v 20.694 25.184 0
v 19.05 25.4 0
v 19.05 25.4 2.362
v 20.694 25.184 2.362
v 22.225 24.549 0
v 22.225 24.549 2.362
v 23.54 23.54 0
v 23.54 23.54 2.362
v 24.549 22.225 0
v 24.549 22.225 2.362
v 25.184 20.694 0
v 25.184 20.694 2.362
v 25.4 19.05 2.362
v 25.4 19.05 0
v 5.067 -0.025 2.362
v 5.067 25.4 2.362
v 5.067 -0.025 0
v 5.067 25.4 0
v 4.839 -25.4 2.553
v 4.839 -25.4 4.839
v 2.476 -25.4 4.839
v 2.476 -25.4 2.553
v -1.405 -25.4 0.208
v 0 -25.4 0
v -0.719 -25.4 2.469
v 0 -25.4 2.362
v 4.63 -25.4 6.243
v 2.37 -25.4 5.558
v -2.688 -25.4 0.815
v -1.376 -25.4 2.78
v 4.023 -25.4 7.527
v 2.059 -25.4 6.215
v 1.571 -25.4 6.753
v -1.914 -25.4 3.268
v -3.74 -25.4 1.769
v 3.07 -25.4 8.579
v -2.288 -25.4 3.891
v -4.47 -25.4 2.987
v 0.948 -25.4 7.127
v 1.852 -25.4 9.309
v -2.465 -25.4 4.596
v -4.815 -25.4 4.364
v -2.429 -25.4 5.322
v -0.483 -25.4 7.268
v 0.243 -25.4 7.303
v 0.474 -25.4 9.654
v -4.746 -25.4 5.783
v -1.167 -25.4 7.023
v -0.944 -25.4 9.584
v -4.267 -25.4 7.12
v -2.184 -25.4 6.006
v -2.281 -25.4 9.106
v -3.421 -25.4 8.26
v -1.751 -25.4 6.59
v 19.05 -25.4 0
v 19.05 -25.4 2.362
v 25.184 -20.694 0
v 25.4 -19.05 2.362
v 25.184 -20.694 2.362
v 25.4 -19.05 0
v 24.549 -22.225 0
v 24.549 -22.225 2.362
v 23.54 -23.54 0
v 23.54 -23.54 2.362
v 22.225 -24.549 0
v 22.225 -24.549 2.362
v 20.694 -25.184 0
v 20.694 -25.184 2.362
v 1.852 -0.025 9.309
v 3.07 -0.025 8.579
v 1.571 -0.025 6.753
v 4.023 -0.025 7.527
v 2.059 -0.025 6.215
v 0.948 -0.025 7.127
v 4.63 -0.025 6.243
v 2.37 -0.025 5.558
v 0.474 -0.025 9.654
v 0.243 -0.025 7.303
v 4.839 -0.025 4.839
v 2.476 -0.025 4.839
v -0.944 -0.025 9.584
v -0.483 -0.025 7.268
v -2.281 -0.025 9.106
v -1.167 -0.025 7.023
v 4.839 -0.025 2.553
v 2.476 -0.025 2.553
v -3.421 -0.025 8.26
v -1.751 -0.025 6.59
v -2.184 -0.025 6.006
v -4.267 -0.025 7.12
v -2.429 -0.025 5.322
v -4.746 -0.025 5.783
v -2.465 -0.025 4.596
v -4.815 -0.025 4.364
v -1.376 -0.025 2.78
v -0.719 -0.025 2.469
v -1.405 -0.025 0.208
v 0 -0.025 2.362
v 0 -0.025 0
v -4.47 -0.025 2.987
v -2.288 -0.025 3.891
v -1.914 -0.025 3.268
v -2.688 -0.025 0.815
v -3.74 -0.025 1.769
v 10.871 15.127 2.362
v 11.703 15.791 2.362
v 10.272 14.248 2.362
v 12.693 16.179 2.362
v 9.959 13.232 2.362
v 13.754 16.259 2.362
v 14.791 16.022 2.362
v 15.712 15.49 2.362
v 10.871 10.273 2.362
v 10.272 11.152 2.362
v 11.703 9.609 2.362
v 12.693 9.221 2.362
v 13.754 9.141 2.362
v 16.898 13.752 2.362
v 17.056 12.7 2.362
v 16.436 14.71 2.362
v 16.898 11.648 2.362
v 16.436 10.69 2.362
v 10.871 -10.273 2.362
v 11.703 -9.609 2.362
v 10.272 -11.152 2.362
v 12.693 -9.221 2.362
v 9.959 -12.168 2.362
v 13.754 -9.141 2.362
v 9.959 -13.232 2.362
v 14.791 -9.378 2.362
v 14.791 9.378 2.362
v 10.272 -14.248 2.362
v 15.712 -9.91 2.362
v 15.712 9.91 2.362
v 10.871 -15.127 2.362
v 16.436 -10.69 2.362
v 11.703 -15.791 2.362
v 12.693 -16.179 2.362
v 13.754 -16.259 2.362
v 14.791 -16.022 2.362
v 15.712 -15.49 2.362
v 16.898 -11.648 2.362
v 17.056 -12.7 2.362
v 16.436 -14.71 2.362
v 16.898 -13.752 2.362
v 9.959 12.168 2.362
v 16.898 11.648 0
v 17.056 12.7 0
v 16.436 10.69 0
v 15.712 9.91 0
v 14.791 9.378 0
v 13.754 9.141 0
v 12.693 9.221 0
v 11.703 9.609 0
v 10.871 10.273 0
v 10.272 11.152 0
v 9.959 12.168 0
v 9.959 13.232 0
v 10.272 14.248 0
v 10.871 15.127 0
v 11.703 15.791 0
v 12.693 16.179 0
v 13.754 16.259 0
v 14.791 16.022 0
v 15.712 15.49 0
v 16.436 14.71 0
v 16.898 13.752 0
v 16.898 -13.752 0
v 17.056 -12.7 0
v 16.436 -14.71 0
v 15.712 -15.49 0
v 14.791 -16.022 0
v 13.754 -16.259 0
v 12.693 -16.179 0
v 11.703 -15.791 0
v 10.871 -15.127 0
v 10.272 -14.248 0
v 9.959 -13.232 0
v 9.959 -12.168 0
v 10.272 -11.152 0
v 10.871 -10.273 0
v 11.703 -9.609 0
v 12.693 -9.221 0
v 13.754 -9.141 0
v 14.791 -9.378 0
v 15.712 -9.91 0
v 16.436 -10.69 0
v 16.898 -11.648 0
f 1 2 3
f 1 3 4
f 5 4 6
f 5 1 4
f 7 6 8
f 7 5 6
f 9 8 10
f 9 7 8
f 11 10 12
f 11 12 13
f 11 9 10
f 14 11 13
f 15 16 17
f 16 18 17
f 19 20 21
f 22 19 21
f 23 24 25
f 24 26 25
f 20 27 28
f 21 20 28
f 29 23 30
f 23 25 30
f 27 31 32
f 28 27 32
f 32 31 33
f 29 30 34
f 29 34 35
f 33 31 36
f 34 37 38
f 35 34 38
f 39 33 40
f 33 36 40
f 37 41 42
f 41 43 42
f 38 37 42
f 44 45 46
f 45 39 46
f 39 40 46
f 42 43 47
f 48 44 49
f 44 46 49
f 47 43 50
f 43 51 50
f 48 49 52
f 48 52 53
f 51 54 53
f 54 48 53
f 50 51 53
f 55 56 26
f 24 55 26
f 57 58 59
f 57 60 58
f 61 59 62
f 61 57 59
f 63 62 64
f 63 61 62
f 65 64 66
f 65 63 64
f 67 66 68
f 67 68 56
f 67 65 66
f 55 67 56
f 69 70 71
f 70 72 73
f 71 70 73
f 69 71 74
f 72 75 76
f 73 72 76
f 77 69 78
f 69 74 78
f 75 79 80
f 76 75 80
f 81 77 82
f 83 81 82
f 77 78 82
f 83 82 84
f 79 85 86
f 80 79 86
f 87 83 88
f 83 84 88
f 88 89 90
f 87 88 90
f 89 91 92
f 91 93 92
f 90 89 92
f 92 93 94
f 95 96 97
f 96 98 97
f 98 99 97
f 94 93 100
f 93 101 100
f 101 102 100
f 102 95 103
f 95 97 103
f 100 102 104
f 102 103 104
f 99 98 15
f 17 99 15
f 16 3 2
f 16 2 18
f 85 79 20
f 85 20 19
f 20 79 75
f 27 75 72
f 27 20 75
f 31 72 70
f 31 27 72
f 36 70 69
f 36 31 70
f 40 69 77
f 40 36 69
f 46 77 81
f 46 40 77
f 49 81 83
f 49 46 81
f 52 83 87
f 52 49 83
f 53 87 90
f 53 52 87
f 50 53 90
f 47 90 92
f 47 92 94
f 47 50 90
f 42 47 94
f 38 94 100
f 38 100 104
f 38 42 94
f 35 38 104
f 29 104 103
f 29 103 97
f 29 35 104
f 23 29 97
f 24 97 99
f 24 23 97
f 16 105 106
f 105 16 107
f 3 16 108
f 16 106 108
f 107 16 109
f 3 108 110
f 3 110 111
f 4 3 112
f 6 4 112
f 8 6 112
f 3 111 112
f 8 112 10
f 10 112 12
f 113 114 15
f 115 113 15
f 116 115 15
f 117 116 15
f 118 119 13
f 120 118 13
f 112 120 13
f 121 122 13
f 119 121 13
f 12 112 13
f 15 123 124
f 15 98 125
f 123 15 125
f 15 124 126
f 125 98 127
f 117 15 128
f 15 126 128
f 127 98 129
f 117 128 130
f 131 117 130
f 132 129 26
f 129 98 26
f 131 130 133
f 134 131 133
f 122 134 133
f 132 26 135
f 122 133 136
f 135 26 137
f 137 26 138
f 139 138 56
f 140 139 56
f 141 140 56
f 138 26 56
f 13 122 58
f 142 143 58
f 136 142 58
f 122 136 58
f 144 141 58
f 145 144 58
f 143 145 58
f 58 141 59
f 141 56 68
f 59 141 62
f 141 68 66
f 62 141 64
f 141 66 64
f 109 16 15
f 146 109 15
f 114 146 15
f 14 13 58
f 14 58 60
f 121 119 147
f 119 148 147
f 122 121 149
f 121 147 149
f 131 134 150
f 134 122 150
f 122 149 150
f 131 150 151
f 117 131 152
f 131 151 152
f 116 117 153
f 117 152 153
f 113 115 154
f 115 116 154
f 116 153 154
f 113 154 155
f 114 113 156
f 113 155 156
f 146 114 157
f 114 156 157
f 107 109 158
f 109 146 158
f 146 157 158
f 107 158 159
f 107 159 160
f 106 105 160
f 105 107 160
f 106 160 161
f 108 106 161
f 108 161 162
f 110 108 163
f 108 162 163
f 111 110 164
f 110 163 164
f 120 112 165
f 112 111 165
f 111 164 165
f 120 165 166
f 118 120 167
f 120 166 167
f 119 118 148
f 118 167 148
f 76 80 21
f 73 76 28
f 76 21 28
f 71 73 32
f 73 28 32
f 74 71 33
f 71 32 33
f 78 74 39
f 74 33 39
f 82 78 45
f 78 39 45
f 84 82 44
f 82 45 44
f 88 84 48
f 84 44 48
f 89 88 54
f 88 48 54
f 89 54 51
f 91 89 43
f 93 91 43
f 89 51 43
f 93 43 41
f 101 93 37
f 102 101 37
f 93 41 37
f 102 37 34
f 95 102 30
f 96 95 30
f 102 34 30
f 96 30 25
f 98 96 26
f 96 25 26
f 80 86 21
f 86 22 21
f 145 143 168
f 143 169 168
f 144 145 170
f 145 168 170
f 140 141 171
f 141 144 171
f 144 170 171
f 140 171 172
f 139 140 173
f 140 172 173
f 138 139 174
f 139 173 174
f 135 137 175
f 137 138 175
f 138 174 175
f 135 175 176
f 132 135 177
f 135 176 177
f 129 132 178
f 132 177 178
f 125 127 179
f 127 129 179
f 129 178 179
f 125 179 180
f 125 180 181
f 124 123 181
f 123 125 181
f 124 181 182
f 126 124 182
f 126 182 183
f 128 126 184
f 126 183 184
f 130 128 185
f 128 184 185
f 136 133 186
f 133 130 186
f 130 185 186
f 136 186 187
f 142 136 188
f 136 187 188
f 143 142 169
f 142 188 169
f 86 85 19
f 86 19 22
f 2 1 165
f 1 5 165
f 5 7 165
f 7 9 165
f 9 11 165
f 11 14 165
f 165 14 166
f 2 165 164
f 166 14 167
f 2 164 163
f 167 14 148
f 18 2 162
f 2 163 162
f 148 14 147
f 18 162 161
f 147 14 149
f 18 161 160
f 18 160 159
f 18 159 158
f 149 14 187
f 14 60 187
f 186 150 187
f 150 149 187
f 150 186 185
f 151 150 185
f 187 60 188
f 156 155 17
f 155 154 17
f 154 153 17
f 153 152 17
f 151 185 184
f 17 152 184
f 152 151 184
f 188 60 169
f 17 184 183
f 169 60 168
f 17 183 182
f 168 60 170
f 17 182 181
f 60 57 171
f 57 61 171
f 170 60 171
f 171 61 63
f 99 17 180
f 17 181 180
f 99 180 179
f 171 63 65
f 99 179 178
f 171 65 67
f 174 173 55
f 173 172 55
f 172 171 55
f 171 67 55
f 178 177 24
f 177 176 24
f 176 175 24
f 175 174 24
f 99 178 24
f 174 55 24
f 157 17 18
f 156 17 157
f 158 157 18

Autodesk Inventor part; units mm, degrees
sketch "Sketch_1" plane through (0, 0, 0) normal (0, 1, 0) x (-1, 0, 0)
  arc A0 (0, 0) -> (-4.8387, 4.8387) centre (0, 4.8387) ccw
  line L0 (-4.8387, 4.8387) -> (-4.8387, 2.5527)
  line L1 (-4.8387, 2.5527) -> (-2.4765, 2.5527)
  line L2 (-2.4765, 2.5527) -> (-2.4765, 4.8387)
  arc A1 (0, 2.3622) -> (-2.4765, 4.8387) centre (0, 4.8387) ccw
  line L3 (0, 2.3622) -> (-25.4, 2.3622)
  line L4 (-25.4, 2.3622) -> (-25.4, 0)
  line L5 (-25.4, 0) -> (0, 0)
extrude "Extrusion1" add sketch "Sketch_1" along normal mid plane 50.8
sketch "Sketch_2" plane through (0, 0, 0) normal (0, 0, 1) x (1, 0, 0)
  line L0 (-25.4, 50.8) -> (-25.4, -50.8)
  line L1 (-25.4, -50.8) -> (50.8, -50.8)
  line L2 (50.8, -50.8) -> (50.8, 50.8)
  line L3 (50.8, 50.8) -> (-25.4, 50.8)
  line L4 (-12.7, -0.0254) -> (-12.7, -25.4)
  line L5 (-12.7, -25.4) -> (19.05, -25.4)
  arc A0 (19.05, -25.4) -> (25.4, -19.05) centre (19.05, -19.05) ccw
  line L6 (25.4, -19.05) -> (25.4, 19.05)
  arc A1 (25.4, 19.05) -> (19.05, 25.4) centre (19.05, 19.05) ccw
  line L7 (19.05, 25.4) -> (5.0673, 25.4)
  line L8 (5.0673, 25.4) -> (5.0673, -0.0254)
  line L9 (5.0673, -0.0254) -> (-12.7, -0.0254)
extrude "Extrusion2" cut sketch "Sketch_2" along normal mid plane 25.4
sketch "Sketch_4" plane through (0, 0, 0) normal (0, 0, 1) x (1, 0, 0)
  circle A0 centre (13.4874, 12.7) radius 3.5687
extrude "Extrusion3" cut sketch "Sketch_4" along normal mid plane 4.7244
sketch "Sketch_5" plane through (0, 0, 0) normal (0, 0, 1) x (1, 0, 0)
  circle A0 centre (13.4874, -12.7) radius 3.5687
extrude "Extrusion4" cut sketch "Sketch_5" along normal mid plane 4.7244
ref_plane "to_left_XY" through (0, 0, 4.8387) normal (0, 1, 0) x (1, 0, 0)
ref_plane "to_left_YZ" through (0, 0, 4.8387) normal (1, 0, 0) x (0, 0, -1)
ref_plane "to_left_ZX" through (0, 0, 4.8387) normal (0, 0, -1) x (0, 1, 0)
properties part number "2838_right"
